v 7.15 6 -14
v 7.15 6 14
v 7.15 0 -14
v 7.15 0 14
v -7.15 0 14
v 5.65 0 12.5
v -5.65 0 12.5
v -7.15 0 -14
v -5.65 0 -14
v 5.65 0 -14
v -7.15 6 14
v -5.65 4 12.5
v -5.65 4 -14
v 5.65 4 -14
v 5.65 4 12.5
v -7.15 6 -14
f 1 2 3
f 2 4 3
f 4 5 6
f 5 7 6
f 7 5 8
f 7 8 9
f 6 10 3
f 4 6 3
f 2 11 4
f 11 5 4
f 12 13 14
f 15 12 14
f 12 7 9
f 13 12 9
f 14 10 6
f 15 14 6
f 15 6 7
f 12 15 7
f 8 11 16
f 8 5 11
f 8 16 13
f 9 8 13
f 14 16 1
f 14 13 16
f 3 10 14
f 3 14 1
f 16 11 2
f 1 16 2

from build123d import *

# Parameters (mm, degrees)
BOSS_EXTRUDE1_DEPTH = 4
SKETCH2_W           = 14.3
SKETCH2_H           = 28
BOSS_EXTRUDE2_DEPTH = 2


with BuildPart() as part:
    # Sketch1 → Boss-Extrude1 (new body)
    with BuildSketch(Plane(origin=(0, 0, 0), x_dir=(1, 0, 0), z_dir=(0, 1, 0))):
        Polygon((-5.65, -12.5), (-5.65, 12.5), (-5.65, 14), (-7.15, 14), (-7.15, -14), (7.15, -14), (7.15, 14), (5.65, 14), (5.65, 12.5), (5.65, -12.5), align=None)
    extrude(amount=BOSS_EXTRUDE1_DEPTH)

    # Sketch2 → Boss-Extrude2 (add)
    with BuildSketch(Plane(origin=(0, 4, 0), x_dir=(1, 0, 0), z_dir=(0, 1, 0))):
        Rectangle(SKETCH2_W, SKETCH2_H)
    extrude(amount=BOSS_EXTRUDE2_DEPTH)


solid = part.part
